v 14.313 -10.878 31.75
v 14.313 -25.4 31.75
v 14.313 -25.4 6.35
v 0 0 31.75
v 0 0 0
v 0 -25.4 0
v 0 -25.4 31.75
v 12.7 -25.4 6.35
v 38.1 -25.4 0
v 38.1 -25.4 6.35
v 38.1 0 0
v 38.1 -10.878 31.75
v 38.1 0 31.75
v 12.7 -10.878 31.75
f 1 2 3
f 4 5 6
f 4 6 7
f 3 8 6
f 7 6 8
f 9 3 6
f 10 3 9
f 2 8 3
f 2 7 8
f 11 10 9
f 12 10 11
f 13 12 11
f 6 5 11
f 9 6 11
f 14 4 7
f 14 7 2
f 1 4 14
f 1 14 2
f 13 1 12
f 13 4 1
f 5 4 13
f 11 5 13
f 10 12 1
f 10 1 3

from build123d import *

# Parameters (mm, degrees)
F0_W     = 38.1
F0_H     = 31.75
F1_DEPTH = 25.4
F2_W     = 23.7869326904
F2_H     = 14.5215898097
F3_DEPTH = 25.4
F5_DEPTH = 25.4


with BuildPart() as f1:
    # F0 (on Front) → F1 (new body)
    with BuildSketch(Plane.XZ):
        with Locations((19.05, 15.875)):
            Rectangle(F0_W, F0_H)
    extrude(amount=F1_DEPTH)

    # F2 (on face) → F3 (cut)
    with BuildSketch(Plane.XY.offset(31.75)):
        with Locations((26.2065336548, -18.1392050952)):
            Rectangle(F2_W, F2_H)
    extrude(amount=-F3_DEPTH, mode=Mode.SUBTRACT)

    # F4 (on face) → F5 (join)
    with BuildSketch(Plane.YZ.offset(38.1)):
        Polygon((-10.8784101903, 31.75), (-25.4, 6.35), (-10.8784101903, 6.35), align=None)
    extrude(amount=-F5_DEPTH)


solid = f1.part
